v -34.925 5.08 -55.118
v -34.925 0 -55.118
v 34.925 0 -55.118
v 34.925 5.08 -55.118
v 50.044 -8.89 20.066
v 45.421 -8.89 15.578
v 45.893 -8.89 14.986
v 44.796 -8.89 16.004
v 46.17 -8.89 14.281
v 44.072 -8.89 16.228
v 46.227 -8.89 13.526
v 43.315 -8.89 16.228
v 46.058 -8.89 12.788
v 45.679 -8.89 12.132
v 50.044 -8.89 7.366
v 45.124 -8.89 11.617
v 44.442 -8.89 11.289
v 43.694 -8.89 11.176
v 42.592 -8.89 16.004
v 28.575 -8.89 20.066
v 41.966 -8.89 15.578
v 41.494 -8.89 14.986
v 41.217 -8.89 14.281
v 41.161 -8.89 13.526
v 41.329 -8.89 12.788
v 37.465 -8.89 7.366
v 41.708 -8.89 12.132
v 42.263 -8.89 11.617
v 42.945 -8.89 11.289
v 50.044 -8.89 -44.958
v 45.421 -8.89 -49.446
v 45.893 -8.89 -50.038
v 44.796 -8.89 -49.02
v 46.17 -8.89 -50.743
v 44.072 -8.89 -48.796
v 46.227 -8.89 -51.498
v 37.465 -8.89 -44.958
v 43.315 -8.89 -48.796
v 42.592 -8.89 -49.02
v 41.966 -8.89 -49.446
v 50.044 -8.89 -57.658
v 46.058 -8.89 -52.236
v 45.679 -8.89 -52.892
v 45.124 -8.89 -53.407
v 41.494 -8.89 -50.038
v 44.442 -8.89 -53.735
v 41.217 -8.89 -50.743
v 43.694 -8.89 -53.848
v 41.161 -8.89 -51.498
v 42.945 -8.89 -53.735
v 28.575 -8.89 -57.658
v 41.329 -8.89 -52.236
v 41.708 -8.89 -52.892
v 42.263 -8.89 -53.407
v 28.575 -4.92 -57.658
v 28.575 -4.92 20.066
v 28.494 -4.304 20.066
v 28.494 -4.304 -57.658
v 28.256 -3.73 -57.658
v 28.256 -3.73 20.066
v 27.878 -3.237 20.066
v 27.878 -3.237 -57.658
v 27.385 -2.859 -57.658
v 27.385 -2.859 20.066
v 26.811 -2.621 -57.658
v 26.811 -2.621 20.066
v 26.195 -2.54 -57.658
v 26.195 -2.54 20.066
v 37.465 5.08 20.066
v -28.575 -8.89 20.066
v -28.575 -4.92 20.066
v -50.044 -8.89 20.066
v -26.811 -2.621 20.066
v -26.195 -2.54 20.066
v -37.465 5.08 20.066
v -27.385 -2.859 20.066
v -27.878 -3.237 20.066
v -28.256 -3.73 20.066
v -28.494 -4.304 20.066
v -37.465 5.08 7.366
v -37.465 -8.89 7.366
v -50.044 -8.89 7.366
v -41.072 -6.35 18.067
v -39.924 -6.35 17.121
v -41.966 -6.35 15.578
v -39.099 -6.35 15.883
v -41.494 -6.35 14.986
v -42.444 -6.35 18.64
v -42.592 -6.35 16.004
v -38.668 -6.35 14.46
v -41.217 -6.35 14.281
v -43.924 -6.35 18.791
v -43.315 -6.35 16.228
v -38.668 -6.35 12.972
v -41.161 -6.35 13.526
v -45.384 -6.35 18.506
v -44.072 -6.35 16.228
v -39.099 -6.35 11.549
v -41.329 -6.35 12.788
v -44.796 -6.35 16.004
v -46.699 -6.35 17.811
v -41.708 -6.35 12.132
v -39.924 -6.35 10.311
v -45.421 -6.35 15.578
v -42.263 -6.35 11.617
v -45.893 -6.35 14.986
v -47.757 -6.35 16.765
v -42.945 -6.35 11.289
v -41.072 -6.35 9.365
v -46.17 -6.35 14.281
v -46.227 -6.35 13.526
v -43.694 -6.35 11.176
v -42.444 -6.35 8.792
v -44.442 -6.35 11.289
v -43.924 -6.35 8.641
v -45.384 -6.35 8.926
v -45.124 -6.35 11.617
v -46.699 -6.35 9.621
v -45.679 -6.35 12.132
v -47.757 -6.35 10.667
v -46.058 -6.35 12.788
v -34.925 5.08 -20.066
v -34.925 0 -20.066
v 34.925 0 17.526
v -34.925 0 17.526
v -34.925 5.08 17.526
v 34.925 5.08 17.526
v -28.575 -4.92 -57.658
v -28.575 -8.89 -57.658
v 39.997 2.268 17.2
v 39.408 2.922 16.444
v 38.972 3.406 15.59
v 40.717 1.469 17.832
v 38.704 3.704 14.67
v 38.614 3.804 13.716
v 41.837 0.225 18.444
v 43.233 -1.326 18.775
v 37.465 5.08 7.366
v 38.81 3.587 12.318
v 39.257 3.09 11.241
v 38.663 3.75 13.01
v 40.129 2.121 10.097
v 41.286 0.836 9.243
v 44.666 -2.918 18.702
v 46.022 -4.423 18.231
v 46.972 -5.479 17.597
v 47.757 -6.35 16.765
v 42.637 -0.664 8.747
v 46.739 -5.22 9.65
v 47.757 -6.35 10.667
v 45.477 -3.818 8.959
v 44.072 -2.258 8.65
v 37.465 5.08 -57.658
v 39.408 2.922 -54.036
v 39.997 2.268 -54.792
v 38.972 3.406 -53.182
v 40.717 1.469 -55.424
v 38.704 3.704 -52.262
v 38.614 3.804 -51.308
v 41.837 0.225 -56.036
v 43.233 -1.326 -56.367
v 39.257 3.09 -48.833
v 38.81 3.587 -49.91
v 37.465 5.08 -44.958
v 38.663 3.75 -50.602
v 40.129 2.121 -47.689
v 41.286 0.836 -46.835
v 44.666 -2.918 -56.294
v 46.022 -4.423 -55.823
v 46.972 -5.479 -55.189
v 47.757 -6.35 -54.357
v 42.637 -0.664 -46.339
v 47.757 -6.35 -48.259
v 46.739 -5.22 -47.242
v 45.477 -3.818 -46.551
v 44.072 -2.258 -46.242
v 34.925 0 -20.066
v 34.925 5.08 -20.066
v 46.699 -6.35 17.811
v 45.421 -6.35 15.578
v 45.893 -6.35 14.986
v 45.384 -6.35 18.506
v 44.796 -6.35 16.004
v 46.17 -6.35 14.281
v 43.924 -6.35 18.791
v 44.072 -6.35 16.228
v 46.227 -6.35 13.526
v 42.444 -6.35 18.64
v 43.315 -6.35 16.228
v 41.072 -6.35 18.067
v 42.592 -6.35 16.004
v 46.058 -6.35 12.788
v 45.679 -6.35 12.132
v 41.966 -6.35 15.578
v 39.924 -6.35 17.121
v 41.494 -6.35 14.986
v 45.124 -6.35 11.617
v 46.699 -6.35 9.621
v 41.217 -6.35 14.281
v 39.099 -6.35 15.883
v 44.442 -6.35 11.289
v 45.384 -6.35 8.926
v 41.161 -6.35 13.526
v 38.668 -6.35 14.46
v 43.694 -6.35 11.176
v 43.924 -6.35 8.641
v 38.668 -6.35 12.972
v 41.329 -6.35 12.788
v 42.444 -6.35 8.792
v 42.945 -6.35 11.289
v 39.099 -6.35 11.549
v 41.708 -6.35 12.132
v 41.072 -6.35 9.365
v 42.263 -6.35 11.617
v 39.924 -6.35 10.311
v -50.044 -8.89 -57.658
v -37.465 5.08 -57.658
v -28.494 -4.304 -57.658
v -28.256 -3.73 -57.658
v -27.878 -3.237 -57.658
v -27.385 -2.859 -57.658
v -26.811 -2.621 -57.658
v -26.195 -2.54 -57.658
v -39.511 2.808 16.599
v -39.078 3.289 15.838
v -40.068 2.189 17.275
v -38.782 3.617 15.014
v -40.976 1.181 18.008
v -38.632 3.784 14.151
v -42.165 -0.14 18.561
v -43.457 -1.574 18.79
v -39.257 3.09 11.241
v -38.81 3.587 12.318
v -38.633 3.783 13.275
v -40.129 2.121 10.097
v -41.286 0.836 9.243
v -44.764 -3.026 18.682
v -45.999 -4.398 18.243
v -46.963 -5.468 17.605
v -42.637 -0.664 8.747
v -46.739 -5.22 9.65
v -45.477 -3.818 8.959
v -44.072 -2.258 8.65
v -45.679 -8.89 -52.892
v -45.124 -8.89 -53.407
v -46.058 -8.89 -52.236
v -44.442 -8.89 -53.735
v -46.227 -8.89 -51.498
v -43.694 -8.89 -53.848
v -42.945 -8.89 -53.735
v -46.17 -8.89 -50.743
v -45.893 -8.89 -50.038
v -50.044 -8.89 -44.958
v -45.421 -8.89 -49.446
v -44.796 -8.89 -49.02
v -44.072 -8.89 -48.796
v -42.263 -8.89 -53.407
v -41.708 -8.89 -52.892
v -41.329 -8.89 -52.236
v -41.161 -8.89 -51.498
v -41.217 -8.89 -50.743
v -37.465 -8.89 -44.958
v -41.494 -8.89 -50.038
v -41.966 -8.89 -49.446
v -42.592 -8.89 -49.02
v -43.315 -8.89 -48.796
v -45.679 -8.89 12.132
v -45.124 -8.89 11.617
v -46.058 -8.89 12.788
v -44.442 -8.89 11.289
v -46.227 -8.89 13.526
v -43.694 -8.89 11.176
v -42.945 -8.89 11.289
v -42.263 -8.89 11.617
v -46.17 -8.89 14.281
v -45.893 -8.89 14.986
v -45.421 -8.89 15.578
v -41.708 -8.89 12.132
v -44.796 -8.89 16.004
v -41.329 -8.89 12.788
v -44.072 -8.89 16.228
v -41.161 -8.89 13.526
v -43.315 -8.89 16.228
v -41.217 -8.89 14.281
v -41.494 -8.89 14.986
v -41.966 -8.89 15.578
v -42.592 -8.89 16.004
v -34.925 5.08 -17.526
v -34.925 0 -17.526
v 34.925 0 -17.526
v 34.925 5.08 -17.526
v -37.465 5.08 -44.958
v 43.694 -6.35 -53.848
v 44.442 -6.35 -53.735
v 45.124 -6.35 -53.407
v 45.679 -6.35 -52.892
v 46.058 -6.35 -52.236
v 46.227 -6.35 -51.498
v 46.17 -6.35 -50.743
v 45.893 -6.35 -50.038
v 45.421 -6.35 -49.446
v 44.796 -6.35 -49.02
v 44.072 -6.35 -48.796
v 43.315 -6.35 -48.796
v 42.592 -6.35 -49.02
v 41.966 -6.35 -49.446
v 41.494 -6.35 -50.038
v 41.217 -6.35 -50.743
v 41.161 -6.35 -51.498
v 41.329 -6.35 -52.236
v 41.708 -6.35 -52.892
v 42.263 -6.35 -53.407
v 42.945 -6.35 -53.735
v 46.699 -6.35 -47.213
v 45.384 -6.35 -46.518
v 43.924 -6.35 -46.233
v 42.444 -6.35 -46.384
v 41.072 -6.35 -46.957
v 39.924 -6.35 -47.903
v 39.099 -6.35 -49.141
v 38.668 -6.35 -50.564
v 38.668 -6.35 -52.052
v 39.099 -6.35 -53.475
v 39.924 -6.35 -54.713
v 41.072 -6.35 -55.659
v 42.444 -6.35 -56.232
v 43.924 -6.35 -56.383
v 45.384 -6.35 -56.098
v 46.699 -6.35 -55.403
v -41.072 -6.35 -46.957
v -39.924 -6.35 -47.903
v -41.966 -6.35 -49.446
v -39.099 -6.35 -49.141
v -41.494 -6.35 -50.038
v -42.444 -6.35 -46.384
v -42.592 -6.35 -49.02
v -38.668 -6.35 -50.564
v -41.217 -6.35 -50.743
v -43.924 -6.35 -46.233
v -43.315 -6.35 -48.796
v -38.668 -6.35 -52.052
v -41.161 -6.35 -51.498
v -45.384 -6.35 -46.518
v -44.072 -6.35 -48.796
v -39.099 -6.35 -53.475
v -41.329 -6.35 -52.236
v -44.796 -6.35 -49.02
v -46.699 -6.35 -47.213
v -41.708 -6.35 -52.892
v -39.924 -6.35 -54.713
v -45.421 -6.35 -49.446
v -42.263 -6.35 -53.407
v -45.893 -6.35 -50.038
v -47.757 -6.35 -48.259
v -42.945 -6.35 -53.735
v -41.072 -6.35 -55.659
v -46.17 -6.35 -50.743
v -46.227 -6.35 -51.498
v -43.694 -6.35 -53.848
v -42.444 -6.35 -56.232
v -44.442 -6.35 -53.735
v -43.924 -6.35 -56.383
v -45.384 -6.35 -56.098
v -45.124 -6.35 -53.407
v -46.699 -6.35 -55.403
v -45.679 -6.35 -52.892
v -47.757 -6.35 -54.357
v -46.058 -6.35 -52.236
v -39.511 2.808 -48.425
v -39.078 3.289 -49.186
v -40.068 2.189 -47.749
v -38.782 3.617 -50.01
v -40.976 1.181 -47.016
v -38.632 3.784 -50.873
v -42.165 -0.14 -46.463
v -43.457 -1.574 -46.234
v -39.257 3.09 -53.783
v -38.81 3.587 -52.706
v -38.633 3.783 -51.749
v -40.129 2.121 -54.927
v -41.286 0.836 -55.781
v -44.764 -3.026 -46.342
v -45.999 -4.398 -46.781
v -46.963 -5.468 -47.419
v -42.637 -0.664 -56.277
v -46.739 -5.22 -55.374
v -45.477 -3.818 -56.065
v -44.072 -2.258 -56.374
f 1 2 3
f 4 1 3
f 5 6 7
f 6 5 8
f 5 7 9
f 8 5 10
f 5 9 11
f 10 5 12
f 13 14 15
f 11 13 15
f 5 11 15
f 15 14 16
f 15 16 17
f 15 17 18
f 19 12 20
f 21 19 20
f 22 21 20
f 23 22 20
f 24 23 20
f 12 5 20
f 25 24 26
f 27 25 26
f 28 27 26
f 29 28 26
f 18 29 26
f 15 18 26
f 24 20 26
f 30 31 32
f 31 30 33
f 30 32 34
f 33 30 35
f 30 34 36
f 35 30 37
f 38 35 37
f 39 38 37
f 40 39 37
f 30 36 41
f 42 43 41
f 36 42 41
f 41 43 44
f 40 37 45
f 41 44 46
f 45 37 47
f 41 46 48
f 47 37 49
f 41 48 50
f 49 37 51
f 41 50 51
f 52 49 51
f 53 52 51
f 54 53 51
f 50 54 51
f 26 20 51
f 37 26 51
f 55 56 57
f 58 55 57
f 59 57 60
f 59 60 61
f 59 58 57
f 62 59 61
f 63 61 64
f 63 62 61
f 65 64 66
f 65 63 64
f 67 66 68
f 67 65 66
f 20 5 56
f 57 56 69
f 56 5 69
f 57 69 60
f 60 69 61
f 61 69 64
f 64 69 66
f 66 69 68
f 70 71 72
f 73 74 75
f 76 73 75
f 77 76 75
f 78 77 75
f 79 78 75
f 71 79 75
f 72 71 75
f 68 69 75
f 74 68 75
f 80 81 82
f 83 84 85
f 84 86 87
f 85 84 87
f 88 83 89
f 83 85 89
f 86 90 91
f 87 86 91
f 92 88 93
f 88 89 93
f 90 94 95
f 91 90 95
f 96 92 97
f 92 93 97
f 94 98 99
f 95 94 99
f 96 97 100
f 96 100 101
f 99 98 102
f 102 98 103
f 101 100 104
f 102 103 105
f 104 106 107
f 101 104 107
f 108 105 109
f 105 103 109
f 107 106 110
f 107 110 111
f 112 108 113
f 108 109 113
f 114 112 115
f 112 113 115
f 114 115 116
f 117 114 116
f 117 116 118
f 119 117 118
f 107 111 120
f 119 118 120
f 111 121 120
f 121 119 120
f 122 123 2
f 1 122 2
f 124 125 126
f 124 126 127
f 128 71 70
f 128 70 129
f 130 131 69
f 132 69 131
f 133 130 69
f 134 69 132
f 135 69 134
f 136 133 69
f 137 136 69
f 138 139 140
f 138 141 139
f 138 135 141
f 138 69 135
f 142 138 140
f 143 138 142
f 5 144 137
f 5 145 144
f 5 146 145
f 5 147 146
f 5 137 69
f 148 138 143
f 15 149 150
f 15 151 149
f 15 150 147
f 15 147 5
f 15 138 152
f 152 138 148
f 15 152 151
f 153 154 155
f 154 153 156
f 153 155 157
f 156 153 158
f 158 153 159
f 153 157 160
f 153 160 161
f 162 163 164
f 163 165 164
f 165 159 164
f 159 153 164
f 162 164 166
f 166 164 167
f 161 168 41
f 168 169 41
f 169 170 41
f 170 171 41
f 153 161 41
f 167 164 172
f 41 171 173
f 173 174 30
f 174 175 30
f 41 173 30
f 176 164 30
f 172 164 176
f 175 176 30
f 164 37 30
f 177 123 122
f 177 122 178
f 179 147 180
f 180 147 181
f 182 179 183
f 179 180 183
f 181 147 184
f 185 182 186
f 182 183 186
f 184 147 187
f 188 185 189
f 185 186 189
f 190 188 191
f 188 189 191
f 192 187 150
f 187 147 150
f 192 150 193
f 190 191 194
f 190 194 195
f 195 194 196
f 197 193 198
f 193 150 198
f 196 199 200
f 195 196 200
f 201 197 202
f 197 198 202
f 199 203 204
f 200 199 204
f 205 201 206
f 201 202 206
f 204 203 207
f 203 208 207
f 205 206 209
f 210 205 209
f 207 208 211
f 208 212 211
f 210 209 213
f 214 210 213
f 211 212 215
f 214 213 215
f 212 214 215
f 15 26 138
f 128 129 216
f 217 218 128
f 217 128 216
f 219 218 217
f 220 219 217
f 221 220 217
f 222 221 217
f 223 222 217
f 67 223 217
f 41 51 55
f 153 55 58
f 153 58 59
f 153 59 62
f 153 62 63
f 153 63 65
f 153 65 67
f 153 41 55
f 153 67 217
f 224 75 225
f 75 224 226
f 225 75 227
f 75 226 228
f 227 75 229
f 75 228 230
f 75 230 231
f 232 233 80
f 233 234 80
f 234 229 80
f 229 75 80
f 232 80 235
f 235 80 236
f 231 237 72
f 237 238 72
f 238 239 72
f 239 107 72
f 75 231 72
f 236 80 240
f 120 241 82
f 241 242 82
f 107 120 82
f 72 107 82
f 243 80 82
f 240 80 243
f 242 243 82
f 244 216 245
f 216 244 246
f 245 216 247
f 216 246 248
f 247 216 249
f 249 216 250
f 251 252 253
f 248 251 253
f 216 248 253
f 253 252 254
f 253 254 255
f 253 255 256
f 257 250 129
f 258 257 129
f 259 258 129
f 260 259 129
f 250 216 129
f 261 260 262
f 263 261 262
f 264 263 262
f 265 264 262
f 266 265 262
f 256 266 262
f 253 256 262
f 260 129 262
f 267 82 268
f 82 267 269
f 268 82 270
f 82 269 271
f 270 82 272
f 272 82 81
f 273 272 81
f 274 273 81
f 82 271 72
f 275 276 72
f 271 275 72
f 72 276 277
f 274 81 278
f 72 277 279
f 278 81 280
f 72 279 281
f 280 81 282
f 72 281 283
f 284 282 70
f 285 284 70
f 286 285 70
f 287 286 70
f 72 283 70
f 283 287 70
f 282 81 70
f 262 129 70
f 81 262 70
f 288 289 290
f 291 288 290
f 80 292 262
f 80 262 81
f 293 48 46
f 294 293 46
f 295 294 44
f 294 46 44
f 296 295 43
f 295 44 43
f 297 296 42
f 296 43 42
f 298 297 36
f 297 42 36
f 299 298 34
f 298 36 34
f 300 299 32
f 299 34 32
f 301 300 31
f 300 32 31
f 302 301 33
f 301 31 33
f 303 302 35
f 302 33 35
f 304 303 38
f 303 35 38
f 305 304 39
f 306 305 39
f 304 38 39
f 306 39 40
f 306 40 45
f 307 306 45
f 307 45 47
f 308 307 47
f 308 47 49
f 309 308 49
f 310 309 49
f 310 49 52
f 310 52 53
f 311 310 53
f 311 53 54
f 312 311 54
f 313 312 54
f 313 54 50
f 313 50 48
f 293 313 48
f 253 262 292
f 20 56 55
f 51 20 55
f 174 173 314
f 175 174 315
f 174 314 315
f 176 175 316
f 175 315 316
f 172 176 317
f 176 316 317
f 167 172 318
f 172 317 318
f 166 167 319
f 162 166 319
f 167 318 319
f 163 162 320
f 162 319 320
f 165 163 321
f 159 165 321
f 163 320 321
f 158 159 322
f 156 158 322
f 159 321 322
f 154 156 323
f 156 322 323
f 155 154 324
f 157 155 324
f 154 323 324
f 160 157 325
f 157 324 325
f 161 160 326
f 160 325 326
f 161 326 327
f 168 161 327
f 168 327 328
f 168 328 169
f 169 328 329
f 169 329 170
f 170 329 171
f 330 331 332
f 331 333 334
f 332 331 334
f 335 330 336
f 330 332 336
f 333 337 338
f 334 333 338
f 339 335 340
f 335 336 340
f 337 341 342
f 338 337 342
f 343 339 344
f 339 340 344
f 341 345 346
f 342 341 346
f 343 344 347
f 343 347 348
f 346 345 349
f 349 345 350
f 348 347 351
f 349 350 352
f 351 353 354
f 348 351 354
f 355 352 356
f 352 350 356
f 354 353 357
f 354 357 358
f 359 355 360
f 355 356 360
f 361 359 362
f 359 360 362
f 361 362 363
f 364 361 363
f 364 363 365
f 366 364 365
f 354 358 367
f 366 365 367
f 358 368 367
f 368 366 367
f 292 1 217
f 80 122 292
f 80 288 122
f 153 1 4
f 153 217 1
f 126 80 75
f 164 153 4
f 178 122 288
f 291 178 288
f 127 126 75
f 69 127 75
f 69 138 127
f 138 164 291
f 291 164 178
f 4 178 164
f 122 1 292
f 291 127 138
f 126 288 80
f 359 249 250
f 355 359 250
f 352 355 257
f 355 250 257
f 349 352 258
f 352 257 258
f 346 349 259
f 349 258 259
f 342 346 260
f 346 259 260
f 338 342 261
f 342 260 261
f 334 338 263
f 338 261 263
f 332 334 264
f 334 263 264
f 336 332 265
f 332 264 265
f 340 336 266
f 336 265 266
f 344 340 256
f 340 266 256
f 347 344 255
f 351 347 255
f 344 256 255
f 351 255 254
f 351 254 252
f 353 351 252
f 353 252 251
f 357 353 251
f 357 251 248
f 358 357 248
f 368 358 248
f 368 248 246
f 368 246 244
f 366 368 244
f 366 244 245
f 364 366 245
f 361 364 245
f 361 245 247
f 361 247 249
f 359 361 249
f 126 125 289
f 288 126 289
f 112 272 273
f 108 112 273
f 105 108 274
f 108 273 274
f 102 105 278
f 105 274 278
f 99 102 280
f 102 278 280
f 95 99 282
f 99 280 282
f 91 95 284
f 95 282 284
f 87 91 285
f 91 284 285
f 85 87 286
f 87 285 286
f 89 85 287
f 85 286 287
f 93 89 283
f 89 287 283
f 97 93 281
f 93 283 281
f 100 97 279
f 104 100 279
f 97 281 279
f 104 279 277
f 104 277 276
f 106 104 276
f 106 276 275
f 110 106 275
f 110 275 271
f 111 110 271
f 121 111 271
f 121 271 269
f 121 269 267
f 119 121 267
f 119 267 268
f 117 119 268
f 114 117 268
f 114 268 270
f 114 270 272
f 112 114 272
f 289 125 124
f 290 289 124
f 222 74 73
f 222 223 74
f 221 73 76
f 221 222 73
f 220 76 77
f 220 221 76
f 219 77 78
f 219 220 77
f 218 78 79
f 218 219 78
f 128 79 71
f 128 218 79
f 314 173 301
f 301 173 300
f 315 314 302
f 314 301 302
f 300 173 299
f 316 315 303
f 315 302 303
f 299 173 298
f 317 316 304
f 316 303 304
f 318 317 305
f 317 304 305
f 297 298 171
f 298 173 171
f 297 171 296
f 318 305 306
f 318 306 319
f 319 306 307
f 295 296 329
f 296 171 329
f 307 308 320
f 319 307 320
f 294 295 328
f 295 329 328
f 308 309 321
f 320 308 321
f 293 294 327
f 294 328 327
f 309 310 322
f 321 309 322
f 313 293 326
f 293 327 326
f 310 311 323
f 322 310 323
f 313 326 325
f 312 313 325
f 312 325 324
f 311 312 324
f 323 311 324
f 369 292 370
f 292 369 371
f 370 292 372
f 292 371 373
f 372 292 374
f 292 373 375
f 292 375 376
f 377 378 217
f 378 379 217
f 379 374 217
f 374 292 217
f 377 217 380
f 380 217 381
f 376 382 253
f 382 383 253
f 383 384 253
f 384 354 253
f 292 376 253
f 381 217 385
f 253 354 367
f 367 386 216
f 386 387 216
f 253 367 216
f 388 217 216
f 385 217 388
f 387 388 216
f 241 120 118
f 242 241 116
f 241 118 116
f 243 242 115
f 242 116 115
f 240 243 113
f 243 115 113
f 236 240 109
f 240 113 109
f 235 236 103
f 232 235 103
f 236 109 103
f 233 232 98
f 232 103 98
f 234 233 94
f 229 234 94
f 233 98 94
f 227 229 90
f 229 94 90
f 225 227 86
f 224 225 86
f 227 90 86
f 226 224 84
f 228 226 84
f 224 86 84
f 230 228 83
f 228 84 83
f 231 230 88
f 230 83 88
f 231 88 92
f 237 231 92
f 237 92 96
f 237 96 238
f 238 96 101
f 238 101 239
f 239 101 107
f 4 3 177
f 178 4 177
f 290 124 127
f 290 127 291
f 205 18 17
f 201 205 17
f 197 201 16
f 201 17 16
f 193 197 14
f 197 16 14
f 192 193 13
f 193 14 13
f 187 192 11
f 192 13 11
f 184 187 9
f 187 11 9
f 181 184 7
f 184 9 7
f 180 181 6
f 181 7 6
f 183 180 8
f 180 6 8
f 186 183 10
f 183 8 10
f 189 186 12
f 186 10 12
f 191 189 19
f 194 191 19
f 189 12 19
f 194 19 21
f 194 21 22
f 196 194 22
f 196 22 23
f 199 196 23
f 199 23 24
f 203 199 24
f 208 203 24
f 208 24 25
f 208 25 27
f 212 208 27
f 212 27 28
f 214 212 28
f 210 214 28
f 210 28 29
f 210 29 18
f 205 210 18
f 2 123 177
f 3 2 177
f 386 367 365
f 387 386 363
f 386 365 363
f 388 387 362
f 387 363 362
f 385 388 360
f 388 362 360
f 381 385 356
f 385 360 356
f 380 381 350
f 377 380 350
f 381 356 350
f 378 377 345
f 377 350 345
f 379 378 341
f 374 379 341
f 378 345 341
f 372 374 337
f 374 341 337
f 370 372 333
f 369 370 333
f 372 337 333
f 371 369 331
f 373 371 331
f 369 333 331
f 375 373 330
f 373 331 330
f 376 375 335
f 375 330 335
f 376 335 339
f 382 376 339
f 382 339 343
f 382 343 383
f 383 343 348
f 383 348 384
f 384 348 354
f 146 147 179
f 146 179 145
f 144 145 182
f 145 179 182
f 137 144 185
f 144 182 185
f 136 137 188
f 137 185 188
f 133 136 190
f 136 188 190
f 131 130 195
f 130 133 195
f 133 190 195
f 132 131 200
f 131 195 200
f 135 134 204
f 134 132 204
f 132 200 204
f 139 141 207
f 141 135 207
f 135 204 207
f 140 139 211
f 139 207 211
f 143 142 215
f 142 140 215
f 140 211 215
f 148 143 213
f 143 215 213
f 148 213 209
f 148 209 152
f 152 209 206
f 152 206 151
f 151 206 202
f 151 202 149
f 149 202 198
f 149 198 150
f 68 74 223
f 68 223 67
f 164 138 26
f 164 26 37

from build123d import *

# Parameters (mm, degrees)
SKETCH1_W           = 74.93
SKETCH1_H           = 40.132
SKETCH1_W_2         = 69.85
SKETCH1_H_2         = 35.052
BOSS_EXTRUDE1_DEPTH = 5.08
SKETCH2_W           = 74.93
SKETCH2_H           = 77.724
BOSS_EXTRUDE2_DEPTH = 2.54
SKETCH3_W           = 8.89
SKETCH3_H           = 77.724
BOSS_EXTRUDE3_DEPTH = 6.35
SKETCH5_W           = 12.7
SKETCH5_H           = 13.97
BOSS_EXTRUDE5_DEPTH = 12.7
SKETCH6_W           = 12.7
SKETCH6_H           = 13.97
BOSS_EXTRUDE6_DEPTH = 12.7
CHAMFER2_SIZE       = 12.7
CHAMFER2_SIZE_2     = 14.104778938
SKETCH7_R           = 2.54
CUT_EXTRUDE1_DEPTH  = 78.614252678
CUT_EXTRUDE2_START  = -2.54
SKETCH8_R           = 5.08
CUT_EXTRUDE2_DEPTH  = 76.074252678
FILLET1_R           = 2.38


with BuildPart() as part:
    # Sketch1 → Boss-Extrude1 (new body)
    # profile 1 of 2: a face of its own
    with BuildSketch(Plane(origin=(0, 0, 0), x_dir=(1, 0, 0), z_dir=(0, 1, 0))):
        Polygon((-37.465, 57.658), (-37.465, 20.066), (-34.925, 20.066), (-34.925, 55.118), (34.925, 55.118), (34.925, 20.066), (37.465, 20.066), (37.465, 57.658), align=None)
    # profile 2 of 2: a face of its own
    with BuildSketch(Plane(origin=(0, 0, 0), x_dir=(1, 0, 0), z_dir=(0, 1, 0))):
        Rectangle(SKETCH1_W, SKETCH1_H)
        Rectangle(SKETCH1_W_2, SKETCH1_H_2, mode=Mode.SUBTRACT)
    extrude(amount=BOSS_EXTRUDE1_DEPTH)

    # Sketch2 → Boss-Extrude2 (add)
    with BuildSketch(Plane.XZ):
        with Locations((0, -18.796)):
            Rectangle(SKETCH2_W, SKETCH2_H)
    extrude(amount=BOSS_EXTRUDE2_DEPTH)

    # Sketch3 → Boss-Extrude3 (add)
    with BuildSketch(Plane(origin=(0, -2.54, 0), x_dir=(-1, 0, 0), z_dir=(0, -1, 0))):
        with Locations((-33.02, 18.796)):
            Rectangle(SKETCH3_W, SKETCH3_H)
        with Locations((33.02, 18.796)):
            Rectangle(SKETCH3_W, SKETCH3_H)
    extrude(amount=BOSS_EXTRUDE3_DEPTH)

    # Sketch5 → Boss-Extrude5 (add)
    with BuildSketch(Plane(origin=(37.465, 0, 0), x_dir=(0, 0, -1), z_dir=(1, 0, 0))):
        with Locations((51.308, -1.905)):
            Rectangle(SKETCH5_W, SKETCH5_H)
        with Locations((-13.716, -1.905)):
            Rectangle(SKETCH5_W, SKETCH5_H)
    extrude(amount=BOSS_EXTRUDE5_DEPTH)

    # Sketch6 → Boss-Extrude6 (add)
    with BuildSketch(Plane.ZY.offset(37.465)):
        with Locations((-51.308, -1.905)):
            Rectangle(SKETCH6_W, SKETCH6_H)
        with Locations((13.716, -1.905)):
            Rectangle(SKETCH6_W, SKETCH6_H)
    extrude(amount=BOSS_EXTRUDE6_DEPTH)

    # Chamfer2
    # the kernel refuses this chamfer: 14.104778938, 12.7 mm, written as the material it takes off along each edge
    with BuildSketch(Plane(origin=(50.165, 5.08, -28.95640044), x_dir=(-0.9994864482690293, 0.03204434000819555, 0), z_dir=(0, 0, 1))) as chamfer2_piece_1:
        Polygon((CHAMFER2_SIZE * 0.999486448269, CHAMFER2_SIZE * 0.0320443400082), (-CHAMFER2_SIZE_2 * 0.0320443400089, CHAMFER2_SIZE_2 * 0.999486448292), (0, 0), align=None)
    extrude(amount=85.34480088, mode=Mode.SUBTRACT)
    with BuildSketch(Plane(origin=(50.165, 5.08, -8.63559956), x_dir=(-0.9994864482690293, 0.03204434000819555, 0), z_dir=(0, 0, -1)), Plane(origin=(-50.165, 5.08, -28.95640044), x_dir=(0.9994864482690293, 0.03204434000819555, 0), z_dir=(0, 0, 1)), Plane(origin=(-50.165, 5.08, -93.98040044), x_dir=(0.9994864482690293, 0.03204434000819555, 0), z_dir=(0, 0, 1))) as chamfer2_piece_2:
        Polygon((CHAMFER2_SIZE * 0.999486448269, -CHAMFER2_SIZE * 0.0320443400082), (-CHAMFER2_SIZE_2 * 0.0320443400089, -CHAMFER2_SIZE_2 * 0.999486448292), (0, 0), align=None)
    extrude(amount=85.34480088, mode=Mode.SUBTRACT)

    # Sketch7 → Cut-Extrude1 (cut, through all)
    with BuildSketch(Plane(origin=(0, -8.89, 0), x_dir=(-1, 0, 0), z_dir=(0, -1, 0))):
        with Locations(Location((-43.693644499, 51.308, 0), (0, 0, 90))):
            Circle(SKETCH7_R)
        with Locations(Location((-43.693644499, -13.716, 0), (0, 0, 90))):
            Circle(SKETCH7_R)
        with Locations(Location((43.693644499, -13.716, 0), (0, 0, 90))):
            Circle(SKETCH7_R)
        with Locations(Location((43.693644499, 51.308, 0), (0, 0, 90))):
            Circle(SKETCH7_R)
    extrude(amount=-CUT_EXTRUDE1_DEPTH, mode=Mode.SUBTRACT)

    # Sketch8 → Cut-Extrude2 (cut, through all)
    with BuildSketch(Plane(origin=(0, -8.89, 0), x_dir=(-1, 0, 0), z_dir=(0, -1, 0)).offset(CUT_EXTRUDE2_START)):
        with Locations((-43.693644499, 51.308)):
            Circle(SKETCH8_R)
        with Locations((-43.693644499, -13.716)):
            Circle(SKETCH8_R)
        with Locations((43.693644499, -13.716)):
            Circle(SKETCH8_R)
        with Locations((43.693644499, 51.308)):
            Circle(SKETCH8_R)
    extrude(amount=-CUT_EXTRUDE2_DEPTH, mode=Mode.SUBTRACT)

    # Fillet1
    fillet1_edges = [part.edges().sort_by_distance(p)[0] for p in [
        (28.575, -2.54, -18.796),
        (-28.575, -2.54, -18.796),
    ]]
    fillet(fillet1_edges, radius=FILLET1_R)


solid = part.part
